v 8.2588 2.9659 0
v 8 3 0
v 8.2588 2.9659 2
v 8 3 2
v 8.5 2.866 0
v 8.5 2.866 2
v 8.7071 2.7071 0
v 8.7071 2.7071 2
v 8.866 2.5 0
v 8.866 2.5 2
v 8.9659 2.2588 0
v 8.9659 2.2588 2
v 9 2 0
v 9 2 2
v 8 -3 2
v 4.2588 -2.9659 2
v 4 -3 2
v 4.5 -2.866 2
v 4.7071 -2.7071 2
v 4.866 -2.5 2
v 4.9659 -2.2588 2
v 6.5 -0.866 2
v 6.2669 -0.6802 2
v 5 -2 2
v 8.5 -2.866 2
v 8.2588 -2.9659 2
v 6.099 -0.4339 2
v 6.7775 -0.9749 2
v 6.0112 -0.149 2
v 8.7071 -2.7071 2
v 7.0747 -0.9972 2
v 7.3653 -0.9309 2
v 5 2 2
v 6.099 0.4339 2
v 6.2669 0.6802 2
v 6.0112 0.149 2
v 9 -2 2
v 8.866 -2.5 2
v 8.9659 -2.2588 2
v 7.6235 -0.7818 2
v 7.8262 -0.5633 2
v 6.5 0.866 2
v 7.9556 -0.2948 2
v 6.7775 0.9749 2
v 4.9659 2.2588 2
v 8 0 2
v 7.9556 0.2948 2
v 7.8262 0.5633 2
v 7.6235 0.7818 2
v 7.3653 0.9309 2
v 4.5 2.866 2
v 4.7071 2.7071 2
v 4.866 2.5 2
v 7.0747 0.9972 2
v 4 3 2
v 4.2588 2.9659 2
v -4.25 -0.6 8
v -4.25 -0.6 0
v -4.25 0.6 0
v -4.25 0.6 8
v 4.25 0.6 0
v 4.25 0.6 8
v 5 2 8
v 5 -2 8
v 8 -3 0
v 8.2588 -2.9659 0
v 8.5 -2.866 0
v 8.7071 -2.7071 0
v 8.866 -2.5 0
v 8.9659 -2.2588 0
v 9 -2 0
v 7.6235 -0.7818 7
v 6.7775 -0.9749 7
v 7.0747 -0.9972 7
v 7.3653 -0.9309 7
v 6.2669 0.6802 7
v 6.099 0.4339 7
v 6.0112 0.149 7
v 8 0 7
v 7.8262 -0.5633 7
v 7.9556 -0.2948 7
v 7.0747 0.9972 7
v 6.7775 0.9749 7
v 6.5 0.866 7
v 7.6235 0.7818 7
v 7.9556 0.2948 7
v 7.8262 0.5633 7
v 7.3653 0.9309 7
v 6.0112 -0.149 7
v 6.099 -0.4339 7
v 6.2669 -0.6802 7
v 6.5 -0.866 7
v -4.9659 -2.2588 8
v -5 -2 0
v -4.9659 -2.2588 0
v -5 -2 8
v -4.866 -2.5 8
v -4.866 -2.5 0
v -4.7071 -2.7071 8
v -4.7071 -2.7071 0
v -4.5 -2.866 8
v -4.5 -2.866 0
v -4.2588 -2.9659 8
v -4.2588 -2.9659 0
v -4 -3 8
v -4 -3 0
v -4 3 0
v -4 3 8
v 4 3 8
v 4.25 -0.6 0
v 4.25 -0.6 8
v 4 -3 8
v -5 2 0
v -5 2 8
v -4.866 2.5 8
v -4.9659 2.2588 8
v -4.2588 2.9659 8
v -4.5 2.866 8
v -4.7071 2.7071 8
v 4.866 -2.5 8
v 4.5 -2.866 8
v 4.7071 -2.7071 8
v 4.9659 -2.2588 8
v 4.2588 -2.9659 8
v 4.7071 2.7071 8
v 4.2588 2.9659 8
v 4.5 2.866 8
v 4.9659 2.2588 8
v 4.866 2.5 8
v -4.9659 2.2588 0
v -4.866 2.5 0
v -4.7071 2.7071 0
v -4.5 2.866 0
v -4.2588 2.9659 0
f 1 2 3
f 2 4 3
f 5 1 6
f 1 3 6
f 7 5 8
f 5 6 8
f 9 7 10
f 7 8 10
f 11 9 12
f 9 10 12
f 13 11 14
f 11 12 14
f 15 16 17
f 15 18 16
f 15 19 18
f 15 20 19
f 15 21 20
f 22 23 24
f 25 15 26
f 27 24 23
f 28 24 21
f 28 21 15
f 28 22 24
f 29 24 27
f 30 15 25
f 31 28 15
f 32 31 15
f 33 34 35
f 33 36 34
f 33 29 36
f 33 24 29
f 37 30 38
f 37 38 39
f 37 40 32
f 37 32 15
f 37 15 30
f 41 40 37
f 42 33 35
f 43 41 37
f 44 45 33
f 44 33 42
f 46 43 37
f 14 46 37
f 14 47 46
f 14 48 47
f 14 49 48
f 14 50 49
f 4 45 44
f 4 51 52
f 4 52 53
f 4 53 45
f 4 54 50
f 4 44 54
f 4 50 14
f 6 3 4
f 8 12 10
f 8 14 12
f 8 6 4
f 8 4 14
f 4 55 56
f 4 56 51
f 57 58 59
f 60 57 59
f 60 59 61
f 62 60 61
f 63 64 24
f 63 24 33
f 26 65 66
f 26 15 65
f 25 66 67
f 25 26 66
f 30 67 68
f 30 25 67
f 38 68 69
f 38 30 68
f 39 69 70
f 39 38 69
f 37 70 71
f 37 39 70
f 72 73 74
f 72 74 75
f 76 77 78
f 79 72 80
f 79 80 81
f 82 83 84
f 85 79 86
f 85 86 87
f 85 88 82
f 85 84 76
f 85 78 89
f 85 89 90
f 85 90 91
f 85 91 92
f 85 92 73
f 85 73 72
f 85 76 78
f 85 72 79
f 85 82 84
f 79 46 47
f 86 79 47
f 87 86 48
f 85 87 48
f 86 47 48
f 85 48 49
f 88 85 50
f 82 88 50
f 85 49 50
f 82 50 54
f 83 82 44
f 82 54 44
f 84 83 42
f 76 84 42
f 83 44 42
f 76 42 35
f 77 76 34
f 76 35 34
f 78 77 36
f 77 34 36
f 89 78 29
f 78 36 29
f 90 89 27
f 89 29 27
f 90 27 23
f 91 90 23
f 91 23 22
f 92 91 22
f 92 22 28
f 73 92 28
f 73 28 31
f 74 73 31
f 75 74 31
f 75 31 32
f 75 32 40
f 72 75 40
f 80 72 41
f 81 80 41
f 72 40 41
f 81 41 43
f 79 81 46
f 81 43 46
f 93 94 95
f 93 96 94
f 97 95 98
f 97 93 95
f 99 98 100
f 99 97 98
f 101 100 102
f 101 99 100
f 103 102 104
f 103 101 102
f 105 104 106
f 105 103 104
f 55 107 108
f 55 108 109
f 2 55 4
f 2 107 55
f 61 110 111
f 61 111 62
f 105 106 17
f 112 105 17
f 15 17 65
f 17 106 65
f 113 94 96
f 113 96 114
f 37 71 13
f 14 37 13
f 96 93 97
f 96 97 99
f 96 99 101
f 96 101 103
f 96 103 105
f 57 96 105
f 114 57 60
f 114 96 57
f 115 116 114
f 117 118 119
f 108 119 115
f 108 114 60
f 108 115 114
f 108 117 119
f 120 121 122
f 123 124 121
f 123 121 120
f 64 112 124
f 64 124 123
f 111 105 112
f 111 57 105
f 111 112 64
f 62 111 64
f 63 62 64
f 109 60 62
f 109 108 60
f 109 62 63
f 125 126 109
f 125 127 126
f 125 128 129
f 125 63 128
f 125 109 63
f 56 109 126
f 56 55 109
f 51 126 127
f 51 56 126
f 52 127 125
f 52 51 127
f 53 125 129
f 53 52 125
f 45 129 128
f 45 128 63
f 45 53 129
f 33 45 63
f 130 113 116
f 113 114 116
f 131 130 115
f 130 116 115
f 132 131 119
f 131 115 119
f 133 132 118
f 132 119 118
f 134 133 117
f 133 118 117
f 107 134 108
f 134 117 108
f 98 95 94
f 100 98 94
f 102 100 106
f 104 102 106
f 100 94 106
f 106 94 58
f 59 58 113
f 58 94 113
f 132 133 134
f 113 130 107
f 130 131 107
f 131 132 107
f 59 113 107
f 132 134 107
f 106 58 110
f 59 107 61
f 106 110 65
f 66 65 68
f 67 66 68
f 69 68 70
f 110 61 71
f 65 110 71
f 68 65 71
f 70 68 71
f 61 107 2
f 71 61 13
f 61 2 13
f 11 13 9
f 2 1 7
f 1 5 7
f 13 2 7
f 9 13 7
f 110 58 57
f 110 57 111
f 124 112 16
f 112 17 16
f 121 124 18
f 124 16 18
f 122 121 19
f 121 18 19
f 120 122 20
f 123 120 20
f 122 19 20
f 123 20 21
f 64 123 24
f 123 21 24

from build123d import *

# Parameters (mm, degrees)
F0_W     = 14
F0_H     = 6
F0_W_2   = 8.5
F0_H_2   = 1.2
F1_DEPTH = 8
F2_W     = 4
F2_H     = 6
F3_DEPTH = 6
F4_R     = 1
F5_DEPTH = 5
F6_R     = 1


with BuildPart() as f1:
    # F0 (on Top) → F1 (new body)
    with BuildSketch(Plane.XY):
        with Locations((2, 0)):
            Rectangle(F0_W, F0_H)
        Rectangle(F0_W_2, F0_H_2, mode=Mode.SUBTRACT)
    extrude(amount=F1_DEPTH)

    # F2 (on face) → F3 (cut)
    with BuildSketch(Plane.XY.offset(8)):
        with Locations((7, 0)):
            Rectangle(F2_W, F2_H)
    extrude(amount=-F3_DEPTH, mode=Mode.SUBTRACT)

    # F4 (on face) → F5 (join)
    with BuildSketch(Plane.XY.offset(2)):
        with Locations((7, 0)):
            Circle(F4_R)
    extrude(amount=F5_DEPTH)

    # F6
    f6_edges = [f1.edges().sort_by_distance(p)[0] for p in [
        (5, 3, 5),
        (5, -3, 5),
        (9, -3, 1),
        (9, 3, 1),
        (-5, 3, 4),
        (-5, -3, 4),
    ]]
    fillet(f6_edges, radius=F6_R)


solid = f1.part
